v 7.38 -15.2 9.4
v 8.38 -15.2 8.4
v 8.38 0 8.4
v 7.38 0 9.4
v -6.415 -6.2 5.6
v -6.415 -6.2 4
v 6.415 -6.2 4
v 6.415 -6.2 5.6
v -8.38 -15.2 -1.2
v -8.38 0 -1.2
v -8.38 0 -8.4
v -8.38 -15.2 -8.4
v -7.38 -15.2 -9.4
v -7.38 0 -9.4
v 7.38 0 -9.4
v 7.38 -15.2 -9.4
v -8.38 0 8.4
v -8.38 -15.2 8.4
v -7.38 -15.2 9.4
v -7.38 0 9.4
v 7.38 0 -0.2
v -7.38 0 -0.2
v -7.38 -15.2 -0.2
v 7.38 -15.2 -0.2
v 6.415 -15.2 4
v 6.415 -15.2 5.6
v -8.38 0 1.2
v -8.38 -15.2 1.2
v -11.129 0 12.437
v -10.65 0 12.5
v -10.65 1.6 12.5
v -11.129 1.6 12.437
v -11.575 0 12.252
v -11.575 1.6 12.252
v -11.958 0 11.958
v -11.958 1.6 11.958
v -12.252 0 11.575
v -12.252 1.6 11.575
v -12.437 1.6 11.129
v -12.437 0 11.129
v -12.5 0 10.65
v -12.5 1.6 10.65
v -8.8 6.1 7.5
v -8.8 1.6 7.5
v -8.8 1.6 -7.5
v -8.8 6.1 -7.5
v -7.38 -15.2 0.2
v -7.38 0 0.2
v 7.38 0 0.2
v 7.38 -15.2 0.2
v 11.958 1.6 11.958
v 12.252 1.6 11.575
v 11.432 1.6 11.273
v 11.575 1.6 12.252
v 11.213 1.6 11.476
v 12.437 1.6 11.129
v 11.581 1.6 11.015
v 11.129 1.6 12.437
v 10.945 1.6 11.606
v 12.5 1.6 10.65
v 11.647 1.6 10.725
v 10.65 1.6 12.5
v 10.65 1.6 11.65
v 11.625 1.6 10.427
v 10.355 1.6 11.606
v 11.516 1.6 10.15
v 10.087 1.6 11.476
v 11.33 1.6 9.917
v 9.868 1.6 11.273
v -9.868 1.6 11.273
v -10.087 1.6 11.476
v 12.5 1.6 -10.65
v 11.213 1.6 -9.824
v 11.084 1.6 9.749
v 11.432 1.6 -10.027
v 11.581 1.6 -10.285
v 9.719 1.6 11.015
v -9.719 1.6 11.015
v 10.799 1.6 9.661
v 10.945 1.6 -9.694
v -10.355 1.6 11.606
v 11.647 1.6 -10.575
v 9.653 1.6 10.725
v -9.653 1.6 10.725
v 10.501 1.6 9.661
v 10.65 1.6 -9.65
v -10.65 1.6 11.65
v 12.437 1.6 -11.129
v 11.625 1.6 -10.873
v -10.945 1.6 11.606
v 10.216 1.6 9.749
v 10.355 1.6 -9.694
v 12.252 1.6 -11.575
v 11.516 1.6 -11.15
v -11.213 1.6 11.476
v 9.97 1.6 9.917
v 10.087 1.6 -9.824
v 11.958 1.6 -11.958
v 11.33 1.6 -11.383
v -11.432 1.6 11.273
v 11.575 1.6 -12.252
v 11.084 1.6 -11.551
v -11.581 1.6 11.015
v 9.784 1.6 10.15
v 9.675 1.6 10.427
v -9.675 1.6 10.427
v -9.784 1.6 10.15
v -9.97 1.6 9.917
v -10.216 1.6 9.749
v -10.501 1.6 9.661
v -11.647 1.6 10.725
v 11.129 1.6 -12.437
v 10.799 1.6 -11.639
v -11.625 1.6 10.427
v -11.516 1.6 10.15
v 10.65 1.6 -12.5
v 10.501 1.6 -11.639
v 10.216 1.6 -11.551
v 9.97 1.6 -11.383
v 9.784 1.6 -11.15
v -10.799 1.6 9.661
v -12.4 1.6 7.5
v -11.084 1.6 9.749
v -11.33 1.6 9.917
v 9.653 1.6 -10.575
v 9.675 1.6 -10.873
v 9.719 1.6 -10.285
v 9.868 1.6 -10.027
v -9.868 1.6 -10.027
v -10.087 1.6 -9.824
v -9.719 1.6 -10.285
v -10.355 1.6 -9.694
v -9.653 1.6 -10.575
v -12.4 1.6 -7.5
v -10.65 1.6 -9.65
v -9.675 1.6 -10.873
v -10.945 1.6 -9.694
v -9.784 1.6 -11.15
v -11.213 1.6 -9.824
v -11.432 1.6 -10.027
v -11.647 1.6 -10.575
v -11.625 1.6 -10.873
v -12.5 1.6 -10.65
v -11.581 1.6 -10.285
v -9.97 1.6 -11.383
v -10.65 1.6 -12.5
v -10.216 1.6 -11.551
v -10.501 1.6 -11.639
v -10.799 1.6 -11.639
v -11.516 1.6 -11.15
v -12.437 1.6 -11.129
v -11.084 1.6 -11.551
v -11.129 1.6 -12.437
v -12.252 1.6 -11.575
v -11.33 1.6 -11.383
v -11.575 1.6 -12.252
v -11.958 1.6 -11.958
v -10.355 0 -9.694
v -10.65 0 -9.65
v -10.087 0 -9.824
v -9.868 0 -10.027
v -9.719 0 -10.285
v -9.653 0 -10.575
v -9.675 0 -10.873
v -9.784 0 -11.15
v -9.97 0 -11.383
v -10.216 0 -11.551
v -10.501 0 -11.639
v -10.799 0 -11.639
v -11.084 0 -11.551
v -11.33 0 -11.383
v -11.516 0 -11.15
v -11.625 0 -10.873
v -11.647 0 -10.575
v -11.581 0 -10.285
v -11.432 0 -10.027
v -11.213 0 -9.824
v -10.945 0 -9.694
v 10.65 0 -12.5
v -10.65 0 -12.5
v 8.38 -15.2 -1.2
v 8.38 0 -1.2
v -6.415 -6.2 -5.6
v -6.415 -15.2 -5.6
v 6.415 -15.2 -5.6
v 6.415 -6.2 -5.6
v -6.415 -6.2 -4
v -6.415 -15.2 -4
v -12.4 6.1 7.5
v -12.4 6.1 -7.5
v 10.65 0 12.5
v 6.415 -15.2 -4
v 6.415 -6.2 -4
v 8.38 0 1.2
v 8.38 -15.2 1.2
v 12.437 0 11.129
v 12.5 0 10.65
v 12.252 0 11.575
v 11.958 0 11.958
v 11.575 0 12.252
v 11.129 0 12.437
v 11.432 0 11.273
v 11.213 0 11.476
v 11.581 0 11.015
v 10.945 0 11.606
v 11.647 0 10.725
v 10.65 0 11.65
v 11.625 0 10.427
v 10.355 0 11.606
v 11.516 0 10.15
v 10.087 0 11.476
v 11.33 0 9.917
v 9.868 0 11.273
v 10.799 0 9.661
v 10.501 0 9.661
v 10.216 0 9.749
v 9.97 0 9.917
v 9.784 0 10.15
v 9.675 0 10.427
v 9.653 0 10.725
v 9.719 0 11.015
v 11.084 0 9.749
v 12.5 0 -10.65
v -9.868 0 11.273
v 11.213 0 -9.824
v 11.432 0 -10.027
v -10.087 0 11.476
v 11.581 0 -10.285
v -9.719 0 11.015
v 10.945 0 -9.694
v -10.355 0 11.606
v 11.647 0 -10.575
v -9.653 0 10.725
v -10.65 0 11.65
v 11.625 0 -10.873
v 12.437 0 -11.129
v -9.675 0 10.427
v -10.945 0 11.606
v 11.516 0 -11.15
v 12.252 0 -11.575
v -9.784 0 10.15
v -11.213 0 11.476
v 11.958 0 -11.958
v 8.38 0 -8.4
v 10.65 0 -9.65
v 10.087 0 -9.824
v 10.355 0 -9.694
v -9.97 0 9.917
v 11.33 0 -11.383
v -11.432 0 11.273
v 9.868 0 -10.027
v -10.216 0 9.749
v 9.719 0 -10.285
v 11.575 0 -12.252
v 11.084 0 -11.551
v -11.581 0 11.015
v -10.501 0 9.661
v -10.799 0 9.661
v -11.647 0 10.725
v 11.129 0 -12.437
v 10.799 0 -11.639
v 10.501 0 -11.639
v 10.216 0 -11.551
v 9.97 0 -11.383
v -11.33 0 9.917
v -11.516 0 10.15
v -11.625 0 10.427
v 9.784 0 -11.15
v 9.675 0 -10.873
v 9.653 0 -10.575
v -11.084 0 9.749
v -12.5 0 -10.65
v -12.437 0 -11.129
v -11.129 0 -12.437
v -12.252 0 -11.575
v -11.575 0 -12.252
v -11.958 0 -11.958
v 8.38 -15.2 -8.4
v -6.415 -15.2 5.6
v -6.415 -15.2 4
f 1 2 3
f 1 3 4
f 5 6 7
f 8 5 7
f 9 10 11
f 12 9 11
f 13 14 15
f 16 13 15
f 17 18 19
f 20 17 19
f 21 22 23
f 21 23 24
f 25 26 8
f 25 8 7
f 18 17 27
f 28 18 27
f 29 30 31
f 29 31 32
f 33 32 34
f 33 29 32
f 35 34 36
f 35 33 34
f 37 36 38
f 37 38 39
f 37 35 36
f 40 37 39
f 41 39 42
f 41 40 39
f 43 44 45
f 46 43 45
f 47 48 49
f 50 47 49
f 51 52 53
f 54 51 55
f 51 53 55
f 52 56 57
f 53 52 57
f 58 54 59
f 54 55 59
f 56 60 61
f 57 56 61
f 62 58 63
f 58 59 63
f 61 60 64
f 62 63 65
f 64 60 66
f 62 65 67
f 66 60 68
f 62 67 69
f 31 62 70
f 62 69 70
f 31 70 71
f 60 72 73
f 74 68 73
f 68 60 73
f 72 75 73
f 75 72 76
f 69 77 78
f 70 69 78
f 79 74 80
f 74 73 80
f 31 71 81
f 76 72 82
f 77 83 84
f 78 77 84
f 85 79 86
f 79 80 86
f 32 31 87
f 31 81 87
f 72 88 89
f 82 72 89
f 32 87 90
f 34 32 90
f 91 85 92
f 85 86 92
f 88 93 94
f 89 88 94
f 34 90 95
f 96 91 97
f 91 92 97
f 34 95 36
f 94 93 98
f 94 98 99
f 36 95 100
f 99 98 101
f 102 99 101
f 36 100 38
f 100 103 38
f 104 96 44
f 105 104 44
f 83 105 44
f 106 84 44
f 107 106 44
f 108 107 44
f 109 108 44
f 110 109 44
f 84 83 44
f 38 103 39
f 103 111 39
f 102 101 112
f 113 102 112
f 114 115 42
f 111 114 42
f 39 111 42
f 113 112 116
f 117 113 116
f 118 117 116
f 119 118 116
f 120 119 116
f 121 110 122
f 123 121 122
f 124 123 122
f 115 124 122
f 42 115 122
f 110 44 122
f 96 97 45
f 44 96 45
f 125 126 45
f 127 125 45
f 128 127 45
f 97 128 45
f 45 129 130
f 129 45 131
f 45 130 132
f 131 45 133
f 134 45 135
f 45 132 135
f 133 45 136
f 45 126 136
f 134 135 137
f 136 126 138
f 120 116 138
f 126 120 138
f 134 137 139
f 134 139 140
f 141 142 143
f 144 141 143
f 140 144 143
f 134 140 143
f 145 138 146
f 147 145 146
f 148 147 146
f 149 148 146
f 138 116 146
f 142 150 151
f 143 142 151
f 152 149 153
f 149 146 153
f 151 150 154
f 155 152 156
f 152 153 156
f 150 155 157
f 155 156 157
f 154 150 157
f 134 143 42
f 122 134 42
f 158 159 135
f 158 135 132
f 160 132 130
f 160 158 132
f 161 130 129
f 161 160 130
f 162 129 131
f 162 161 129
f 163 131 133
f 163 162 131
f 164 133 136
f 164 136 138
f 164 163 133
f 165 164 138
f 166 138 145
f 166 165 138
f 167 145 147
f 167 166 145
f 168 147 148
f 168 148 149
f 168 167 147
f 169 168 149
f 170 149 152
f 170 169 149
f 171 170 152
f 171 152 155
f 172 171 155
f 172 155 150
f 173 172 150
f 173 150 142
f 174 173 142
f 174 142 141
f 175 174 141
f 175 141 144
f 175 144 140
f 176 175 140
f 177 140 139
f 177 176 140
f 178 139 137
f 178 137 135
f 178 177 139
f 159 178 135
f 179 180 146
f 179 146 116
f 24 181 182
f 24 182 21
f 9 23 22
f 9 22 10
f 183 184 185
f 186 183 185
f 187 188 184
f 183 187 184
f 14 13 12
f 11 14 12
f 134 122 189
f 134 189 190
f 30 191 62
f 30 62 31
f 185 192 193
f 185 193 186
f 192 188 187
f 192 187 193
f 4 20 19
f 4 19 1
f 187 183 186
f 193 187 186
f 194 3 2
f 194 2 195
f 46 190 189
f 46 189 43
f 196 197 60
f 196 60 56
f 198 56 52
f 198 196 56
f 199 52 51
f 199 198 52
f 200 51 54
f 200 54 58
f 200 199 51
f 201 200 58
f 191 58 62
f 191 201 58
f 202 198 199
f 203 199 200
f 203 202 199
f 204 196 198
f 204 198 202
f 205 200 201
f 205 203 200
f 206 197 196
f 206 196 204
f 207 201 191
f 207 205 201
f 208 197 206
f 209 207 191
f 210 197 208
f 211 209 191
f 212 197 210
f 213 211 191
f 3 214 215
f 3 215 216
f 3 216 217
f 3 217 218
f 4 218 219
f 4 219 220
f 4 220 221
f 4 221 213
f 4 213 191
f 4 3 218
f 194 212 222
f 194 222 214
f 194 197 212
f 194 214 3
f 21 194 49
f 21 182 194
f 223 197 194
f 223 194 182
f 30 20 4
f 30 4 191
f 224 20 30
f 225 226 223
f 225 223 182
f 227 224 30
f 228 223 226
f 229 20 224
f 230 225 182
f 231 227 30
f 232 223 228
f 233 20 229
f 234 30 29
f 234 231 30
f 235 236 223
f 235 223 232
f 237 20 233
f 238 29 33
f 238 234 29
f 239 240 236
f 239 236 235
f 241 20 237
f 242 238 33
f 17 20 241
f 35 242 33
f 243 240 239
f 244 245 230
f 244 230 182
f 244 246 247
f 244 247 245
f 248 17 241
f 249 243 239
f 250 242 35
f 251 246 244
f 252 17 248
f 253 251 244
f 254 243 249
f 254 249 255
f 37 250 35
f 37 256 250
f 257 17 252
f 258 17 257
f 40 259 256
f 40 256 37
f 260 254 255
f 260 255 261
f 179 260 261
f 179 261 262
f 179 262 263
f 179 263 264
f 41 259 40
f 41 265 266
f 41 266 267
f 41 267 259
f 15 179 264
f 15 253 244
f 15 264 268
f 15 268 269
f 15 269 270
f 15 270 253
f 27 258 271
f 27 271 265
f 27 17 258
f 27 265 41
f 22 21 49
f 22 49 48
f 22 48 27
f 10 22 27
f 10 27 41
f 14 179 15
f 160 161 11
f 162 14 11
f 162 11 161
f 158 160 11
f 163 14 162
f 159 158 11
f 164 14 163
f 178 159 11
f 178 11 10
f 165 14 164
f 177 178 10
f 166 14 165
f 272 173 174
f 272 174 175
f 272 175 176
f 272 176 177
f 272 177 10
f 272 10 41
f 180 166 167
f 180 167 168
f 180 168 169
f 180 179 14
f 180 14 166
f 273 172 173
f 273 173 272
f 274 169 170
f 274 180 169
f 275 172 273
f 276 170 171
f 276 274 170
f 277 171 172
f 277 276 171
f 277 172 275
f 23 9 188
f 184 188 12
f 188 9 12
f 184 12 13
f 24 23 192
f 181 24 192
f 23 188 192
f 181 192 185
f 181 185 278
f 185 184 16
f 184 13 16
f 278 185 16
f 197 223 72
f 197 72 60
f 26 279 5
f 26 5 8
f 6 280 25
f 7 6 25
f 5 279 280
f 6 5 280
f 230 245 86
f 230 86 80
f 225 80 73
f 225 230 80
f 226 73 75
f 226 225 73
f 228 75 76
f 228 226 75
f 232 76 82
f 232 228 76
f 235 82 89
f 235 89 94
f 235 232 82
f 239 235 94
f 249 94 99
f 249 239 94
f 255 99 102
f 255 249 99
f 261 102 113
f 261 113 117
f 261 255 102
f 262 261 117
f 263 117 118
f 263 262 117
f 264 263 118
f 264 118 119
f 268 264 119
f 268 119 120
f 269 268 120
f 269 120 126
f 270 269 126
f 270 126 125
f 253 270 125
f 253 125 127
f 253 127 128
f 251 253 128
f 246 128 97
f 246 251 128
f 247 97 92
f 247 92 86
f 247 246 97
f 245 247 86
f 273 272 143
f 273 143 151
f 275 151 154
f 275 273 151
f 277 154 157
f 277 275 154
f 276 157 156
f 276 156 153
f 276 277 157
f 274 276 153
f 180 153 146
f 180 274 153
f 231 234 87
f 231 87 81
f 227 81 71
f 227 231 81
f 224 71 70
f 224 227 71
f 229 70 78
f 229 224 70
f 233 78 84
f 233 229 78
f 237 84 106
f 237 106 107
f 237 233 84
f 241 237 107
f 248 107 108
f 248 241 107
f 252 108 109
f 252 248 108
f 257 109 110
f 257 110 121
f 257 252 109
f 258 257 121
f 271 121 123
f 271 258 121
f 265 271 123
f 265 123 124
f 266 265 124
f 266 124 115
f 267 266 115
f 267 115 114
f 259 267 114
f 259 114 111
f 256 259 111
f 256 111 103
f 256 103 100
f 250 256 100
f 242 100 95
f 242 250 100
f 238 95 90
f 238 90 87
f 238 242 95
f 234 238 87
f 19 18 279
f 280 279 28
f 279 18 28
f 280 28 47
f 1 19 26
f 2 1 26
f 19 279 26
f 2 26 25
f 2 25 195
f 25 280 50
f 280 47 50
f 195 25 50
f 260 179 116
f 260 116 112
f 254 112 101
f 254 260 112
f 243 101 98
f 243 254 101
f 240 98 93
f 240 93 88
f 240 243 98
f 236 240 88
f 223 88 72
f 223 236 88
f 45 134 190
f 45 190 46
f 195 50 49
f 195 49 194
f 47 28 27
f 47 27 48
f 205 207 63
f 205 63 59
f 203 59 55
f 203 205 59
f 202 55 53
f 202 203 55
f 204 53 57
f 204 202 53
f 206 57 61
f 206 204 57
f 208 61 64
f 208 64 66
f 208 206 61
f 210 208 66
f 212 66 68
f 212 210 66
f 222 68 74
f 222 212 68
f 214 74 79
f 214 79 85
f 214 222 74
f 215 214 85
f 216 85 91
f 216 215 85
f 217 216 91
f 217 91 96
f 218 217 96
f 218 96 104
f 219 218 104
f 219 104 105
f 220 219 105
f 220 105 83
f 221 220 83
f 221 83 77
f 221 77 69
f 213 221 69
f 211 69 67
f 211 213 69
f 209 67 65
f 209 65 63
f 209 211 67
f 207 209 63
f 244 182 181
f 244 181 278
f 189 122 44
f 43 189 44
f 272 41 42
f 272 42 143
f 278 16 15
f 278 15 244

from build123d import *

# Parameters (mm, degrees)
SKETCH_1_R          = 1
EXTRUDE_1_DEPTH     = 1.6
SKETCH_2_W          = 16.76
SKETCH_2_H          = 9.2
EXTRUDE_2_DEPTH     = 15.2
CUT_EXTRUDE_START   = -15.2
SKETCH_3_W          = 12.83
SKETCH_3_H          = 1.6
CUT_EXTRUDE_2_DEPTH = 9
CUT_EXTRUDE_3_DEPTH = 15.2
EXTRUDE_START       = 1.6
SKETCH_7_W          = 3.6
SKETCH_7_H          = 15
EXTRUDE_4_DEPTH     = 4.5


with BuildPart() as part:
    # 草图1 → 凸台-拉伸1 (new body)
    with BuildSketch(Plane(origin=(0, 0, 0), x_dir=(1, 0, 0), z_dir=(0, 1, 0))):
        with BuildLine():
            Line((-10.65, 12.5), (10.65, 12.5))
            ThreePointArc((10.65, 12.5), (11.958147545, 11.958147545), (12.5, 10.65))
            Line((12.5, 10.65), (12.5, -10.65))
            ThreePointArc((12.5, -10.65), (11.958147545, -11.958147545), (10.65, -12.5))
            Line((10.65, -12.5), (-10.65, -12.5))
            ThreePointArc((-10.65, -12.5), (-11.958147545, -11.958147545), (-12.5, -10.65))
            Line((-12.5, -10.65), (-12.5, 10.65))
            ThreePointArc((-12.5, 10.65), (-11.958147545, 11.958147545), (-10.65, 12.5))
        make_face()
        with Locations(Location((-10.65, 10.65, 0), (0, 0, 270))):
            Circle(SKETCH_1_R, mode=Mode.SUBTRACT)
        with Locations(Location((-10.65, -10.65, 0), (0, 0, 270))):
            Circle(SKETCH_1_R, mode=Mode.SUBTRACT)
        with Locations(Location((10.65, -10.65, 0), (0, 0, 270))):
            Circle(SKETCH_1_R, mode=Mode.SUBTRACT)
        with Locations(Location((10.65, 10.65, 0), (0, 0, 270))):
            Circle(SKETCH_1_R, mode=Mode.SUBTRACT)
    extrude(amount=EXTRUDE_1_DEPTH)

    # 草图2 → 凸台-拉伸2 (add)
    with BuildSketch(Plane(origin=(0, 0, 0), x_dir=(1, 0, 0), z_dir=(0, 1, 0))):
        with Locations((0, 4.8)):
            Rectangle(SKETCH_2_W, SKETCH_2_H)
        with Locations((0, -4.8)):
            Rectangle(SKETCH_2_W, SKETCH_2_H)
    extrude(amount=-EXTRUDE_2_DEPTH)

    # 草图3 → 切除-拉伸2 (cut)
    with BuildSketch(Plane(origin=(0, 0, 0), x_dir=(1, 0, 0), z_dir=(0, 1, 0)).offset(CUT_EXTRUDE_START)):
        with Locations((0, -4.8)):
            Rectangle(SKETCH_3_W, SKETCH_3_H)
        with Locations((0, 4.8)):
            Rectangle(SKETCH_3_W, SKETCH_3_H)
    extrude(amount=CUT_EXTRUDE_2_DEPTH, mode=Mode.SUBTRACT)

    # 草图5 → 切除-拉伸3 (cut)
    with BuildSketch(Plane(origin=(0, 0, 0), x_dir=(1, 0, 0), z_dir=(0, 1, 0)).offset(CUT_EXTRUDE_START)):
        Polygon((-8.38, -9.4), (-8.38, -8.4), (-7.38, -9.4), align=None)
        Polygon((7.38, -9.4), (8.38, -9.4), (8.38, -8.4), align=None)
        Polygon((-8.38, -0.2), (-8.38, -1.2), (-7.38, -0.2), align=None)
        Polygon((8.38, -0.2), (7.38, -0.2), (8.38, -1.2), align=None)
        Polygon((-8.38, 0.2), (-7.38, 0.2), (-8.38, 1.2), align=None)
        Polygon((-8.38, 9.4), (-7.38, 9.4), (-8.38, 8.4), align=None)
        Polygon((8.38, 9.4), (7.38, 9.4), (8.38, 8.4), align=None)
        Polygon((7.38, 0.2), (8.38, 0.2), (8.38, 1.2), align=None)
    extrude(amount=CUT_EXTRUDE_3_DEPTH, mode=Mode.SUBTRACT)

    # 草图7 → 凸台-拉伸4 (add)
    with BuildSketch(Plane(origin=(0, 0, 0), x_dir=(1, 0, 0), z_dir=(0, 1, 0)).offset(EXTRUDE_START)):
        with Locations((-10.6, 0)):
            Rectangle(SKETCH_7_W, SKETCH_7_H)
    extrude(amount=EXTRUDE_4_DEPTH)


solid = part.part
